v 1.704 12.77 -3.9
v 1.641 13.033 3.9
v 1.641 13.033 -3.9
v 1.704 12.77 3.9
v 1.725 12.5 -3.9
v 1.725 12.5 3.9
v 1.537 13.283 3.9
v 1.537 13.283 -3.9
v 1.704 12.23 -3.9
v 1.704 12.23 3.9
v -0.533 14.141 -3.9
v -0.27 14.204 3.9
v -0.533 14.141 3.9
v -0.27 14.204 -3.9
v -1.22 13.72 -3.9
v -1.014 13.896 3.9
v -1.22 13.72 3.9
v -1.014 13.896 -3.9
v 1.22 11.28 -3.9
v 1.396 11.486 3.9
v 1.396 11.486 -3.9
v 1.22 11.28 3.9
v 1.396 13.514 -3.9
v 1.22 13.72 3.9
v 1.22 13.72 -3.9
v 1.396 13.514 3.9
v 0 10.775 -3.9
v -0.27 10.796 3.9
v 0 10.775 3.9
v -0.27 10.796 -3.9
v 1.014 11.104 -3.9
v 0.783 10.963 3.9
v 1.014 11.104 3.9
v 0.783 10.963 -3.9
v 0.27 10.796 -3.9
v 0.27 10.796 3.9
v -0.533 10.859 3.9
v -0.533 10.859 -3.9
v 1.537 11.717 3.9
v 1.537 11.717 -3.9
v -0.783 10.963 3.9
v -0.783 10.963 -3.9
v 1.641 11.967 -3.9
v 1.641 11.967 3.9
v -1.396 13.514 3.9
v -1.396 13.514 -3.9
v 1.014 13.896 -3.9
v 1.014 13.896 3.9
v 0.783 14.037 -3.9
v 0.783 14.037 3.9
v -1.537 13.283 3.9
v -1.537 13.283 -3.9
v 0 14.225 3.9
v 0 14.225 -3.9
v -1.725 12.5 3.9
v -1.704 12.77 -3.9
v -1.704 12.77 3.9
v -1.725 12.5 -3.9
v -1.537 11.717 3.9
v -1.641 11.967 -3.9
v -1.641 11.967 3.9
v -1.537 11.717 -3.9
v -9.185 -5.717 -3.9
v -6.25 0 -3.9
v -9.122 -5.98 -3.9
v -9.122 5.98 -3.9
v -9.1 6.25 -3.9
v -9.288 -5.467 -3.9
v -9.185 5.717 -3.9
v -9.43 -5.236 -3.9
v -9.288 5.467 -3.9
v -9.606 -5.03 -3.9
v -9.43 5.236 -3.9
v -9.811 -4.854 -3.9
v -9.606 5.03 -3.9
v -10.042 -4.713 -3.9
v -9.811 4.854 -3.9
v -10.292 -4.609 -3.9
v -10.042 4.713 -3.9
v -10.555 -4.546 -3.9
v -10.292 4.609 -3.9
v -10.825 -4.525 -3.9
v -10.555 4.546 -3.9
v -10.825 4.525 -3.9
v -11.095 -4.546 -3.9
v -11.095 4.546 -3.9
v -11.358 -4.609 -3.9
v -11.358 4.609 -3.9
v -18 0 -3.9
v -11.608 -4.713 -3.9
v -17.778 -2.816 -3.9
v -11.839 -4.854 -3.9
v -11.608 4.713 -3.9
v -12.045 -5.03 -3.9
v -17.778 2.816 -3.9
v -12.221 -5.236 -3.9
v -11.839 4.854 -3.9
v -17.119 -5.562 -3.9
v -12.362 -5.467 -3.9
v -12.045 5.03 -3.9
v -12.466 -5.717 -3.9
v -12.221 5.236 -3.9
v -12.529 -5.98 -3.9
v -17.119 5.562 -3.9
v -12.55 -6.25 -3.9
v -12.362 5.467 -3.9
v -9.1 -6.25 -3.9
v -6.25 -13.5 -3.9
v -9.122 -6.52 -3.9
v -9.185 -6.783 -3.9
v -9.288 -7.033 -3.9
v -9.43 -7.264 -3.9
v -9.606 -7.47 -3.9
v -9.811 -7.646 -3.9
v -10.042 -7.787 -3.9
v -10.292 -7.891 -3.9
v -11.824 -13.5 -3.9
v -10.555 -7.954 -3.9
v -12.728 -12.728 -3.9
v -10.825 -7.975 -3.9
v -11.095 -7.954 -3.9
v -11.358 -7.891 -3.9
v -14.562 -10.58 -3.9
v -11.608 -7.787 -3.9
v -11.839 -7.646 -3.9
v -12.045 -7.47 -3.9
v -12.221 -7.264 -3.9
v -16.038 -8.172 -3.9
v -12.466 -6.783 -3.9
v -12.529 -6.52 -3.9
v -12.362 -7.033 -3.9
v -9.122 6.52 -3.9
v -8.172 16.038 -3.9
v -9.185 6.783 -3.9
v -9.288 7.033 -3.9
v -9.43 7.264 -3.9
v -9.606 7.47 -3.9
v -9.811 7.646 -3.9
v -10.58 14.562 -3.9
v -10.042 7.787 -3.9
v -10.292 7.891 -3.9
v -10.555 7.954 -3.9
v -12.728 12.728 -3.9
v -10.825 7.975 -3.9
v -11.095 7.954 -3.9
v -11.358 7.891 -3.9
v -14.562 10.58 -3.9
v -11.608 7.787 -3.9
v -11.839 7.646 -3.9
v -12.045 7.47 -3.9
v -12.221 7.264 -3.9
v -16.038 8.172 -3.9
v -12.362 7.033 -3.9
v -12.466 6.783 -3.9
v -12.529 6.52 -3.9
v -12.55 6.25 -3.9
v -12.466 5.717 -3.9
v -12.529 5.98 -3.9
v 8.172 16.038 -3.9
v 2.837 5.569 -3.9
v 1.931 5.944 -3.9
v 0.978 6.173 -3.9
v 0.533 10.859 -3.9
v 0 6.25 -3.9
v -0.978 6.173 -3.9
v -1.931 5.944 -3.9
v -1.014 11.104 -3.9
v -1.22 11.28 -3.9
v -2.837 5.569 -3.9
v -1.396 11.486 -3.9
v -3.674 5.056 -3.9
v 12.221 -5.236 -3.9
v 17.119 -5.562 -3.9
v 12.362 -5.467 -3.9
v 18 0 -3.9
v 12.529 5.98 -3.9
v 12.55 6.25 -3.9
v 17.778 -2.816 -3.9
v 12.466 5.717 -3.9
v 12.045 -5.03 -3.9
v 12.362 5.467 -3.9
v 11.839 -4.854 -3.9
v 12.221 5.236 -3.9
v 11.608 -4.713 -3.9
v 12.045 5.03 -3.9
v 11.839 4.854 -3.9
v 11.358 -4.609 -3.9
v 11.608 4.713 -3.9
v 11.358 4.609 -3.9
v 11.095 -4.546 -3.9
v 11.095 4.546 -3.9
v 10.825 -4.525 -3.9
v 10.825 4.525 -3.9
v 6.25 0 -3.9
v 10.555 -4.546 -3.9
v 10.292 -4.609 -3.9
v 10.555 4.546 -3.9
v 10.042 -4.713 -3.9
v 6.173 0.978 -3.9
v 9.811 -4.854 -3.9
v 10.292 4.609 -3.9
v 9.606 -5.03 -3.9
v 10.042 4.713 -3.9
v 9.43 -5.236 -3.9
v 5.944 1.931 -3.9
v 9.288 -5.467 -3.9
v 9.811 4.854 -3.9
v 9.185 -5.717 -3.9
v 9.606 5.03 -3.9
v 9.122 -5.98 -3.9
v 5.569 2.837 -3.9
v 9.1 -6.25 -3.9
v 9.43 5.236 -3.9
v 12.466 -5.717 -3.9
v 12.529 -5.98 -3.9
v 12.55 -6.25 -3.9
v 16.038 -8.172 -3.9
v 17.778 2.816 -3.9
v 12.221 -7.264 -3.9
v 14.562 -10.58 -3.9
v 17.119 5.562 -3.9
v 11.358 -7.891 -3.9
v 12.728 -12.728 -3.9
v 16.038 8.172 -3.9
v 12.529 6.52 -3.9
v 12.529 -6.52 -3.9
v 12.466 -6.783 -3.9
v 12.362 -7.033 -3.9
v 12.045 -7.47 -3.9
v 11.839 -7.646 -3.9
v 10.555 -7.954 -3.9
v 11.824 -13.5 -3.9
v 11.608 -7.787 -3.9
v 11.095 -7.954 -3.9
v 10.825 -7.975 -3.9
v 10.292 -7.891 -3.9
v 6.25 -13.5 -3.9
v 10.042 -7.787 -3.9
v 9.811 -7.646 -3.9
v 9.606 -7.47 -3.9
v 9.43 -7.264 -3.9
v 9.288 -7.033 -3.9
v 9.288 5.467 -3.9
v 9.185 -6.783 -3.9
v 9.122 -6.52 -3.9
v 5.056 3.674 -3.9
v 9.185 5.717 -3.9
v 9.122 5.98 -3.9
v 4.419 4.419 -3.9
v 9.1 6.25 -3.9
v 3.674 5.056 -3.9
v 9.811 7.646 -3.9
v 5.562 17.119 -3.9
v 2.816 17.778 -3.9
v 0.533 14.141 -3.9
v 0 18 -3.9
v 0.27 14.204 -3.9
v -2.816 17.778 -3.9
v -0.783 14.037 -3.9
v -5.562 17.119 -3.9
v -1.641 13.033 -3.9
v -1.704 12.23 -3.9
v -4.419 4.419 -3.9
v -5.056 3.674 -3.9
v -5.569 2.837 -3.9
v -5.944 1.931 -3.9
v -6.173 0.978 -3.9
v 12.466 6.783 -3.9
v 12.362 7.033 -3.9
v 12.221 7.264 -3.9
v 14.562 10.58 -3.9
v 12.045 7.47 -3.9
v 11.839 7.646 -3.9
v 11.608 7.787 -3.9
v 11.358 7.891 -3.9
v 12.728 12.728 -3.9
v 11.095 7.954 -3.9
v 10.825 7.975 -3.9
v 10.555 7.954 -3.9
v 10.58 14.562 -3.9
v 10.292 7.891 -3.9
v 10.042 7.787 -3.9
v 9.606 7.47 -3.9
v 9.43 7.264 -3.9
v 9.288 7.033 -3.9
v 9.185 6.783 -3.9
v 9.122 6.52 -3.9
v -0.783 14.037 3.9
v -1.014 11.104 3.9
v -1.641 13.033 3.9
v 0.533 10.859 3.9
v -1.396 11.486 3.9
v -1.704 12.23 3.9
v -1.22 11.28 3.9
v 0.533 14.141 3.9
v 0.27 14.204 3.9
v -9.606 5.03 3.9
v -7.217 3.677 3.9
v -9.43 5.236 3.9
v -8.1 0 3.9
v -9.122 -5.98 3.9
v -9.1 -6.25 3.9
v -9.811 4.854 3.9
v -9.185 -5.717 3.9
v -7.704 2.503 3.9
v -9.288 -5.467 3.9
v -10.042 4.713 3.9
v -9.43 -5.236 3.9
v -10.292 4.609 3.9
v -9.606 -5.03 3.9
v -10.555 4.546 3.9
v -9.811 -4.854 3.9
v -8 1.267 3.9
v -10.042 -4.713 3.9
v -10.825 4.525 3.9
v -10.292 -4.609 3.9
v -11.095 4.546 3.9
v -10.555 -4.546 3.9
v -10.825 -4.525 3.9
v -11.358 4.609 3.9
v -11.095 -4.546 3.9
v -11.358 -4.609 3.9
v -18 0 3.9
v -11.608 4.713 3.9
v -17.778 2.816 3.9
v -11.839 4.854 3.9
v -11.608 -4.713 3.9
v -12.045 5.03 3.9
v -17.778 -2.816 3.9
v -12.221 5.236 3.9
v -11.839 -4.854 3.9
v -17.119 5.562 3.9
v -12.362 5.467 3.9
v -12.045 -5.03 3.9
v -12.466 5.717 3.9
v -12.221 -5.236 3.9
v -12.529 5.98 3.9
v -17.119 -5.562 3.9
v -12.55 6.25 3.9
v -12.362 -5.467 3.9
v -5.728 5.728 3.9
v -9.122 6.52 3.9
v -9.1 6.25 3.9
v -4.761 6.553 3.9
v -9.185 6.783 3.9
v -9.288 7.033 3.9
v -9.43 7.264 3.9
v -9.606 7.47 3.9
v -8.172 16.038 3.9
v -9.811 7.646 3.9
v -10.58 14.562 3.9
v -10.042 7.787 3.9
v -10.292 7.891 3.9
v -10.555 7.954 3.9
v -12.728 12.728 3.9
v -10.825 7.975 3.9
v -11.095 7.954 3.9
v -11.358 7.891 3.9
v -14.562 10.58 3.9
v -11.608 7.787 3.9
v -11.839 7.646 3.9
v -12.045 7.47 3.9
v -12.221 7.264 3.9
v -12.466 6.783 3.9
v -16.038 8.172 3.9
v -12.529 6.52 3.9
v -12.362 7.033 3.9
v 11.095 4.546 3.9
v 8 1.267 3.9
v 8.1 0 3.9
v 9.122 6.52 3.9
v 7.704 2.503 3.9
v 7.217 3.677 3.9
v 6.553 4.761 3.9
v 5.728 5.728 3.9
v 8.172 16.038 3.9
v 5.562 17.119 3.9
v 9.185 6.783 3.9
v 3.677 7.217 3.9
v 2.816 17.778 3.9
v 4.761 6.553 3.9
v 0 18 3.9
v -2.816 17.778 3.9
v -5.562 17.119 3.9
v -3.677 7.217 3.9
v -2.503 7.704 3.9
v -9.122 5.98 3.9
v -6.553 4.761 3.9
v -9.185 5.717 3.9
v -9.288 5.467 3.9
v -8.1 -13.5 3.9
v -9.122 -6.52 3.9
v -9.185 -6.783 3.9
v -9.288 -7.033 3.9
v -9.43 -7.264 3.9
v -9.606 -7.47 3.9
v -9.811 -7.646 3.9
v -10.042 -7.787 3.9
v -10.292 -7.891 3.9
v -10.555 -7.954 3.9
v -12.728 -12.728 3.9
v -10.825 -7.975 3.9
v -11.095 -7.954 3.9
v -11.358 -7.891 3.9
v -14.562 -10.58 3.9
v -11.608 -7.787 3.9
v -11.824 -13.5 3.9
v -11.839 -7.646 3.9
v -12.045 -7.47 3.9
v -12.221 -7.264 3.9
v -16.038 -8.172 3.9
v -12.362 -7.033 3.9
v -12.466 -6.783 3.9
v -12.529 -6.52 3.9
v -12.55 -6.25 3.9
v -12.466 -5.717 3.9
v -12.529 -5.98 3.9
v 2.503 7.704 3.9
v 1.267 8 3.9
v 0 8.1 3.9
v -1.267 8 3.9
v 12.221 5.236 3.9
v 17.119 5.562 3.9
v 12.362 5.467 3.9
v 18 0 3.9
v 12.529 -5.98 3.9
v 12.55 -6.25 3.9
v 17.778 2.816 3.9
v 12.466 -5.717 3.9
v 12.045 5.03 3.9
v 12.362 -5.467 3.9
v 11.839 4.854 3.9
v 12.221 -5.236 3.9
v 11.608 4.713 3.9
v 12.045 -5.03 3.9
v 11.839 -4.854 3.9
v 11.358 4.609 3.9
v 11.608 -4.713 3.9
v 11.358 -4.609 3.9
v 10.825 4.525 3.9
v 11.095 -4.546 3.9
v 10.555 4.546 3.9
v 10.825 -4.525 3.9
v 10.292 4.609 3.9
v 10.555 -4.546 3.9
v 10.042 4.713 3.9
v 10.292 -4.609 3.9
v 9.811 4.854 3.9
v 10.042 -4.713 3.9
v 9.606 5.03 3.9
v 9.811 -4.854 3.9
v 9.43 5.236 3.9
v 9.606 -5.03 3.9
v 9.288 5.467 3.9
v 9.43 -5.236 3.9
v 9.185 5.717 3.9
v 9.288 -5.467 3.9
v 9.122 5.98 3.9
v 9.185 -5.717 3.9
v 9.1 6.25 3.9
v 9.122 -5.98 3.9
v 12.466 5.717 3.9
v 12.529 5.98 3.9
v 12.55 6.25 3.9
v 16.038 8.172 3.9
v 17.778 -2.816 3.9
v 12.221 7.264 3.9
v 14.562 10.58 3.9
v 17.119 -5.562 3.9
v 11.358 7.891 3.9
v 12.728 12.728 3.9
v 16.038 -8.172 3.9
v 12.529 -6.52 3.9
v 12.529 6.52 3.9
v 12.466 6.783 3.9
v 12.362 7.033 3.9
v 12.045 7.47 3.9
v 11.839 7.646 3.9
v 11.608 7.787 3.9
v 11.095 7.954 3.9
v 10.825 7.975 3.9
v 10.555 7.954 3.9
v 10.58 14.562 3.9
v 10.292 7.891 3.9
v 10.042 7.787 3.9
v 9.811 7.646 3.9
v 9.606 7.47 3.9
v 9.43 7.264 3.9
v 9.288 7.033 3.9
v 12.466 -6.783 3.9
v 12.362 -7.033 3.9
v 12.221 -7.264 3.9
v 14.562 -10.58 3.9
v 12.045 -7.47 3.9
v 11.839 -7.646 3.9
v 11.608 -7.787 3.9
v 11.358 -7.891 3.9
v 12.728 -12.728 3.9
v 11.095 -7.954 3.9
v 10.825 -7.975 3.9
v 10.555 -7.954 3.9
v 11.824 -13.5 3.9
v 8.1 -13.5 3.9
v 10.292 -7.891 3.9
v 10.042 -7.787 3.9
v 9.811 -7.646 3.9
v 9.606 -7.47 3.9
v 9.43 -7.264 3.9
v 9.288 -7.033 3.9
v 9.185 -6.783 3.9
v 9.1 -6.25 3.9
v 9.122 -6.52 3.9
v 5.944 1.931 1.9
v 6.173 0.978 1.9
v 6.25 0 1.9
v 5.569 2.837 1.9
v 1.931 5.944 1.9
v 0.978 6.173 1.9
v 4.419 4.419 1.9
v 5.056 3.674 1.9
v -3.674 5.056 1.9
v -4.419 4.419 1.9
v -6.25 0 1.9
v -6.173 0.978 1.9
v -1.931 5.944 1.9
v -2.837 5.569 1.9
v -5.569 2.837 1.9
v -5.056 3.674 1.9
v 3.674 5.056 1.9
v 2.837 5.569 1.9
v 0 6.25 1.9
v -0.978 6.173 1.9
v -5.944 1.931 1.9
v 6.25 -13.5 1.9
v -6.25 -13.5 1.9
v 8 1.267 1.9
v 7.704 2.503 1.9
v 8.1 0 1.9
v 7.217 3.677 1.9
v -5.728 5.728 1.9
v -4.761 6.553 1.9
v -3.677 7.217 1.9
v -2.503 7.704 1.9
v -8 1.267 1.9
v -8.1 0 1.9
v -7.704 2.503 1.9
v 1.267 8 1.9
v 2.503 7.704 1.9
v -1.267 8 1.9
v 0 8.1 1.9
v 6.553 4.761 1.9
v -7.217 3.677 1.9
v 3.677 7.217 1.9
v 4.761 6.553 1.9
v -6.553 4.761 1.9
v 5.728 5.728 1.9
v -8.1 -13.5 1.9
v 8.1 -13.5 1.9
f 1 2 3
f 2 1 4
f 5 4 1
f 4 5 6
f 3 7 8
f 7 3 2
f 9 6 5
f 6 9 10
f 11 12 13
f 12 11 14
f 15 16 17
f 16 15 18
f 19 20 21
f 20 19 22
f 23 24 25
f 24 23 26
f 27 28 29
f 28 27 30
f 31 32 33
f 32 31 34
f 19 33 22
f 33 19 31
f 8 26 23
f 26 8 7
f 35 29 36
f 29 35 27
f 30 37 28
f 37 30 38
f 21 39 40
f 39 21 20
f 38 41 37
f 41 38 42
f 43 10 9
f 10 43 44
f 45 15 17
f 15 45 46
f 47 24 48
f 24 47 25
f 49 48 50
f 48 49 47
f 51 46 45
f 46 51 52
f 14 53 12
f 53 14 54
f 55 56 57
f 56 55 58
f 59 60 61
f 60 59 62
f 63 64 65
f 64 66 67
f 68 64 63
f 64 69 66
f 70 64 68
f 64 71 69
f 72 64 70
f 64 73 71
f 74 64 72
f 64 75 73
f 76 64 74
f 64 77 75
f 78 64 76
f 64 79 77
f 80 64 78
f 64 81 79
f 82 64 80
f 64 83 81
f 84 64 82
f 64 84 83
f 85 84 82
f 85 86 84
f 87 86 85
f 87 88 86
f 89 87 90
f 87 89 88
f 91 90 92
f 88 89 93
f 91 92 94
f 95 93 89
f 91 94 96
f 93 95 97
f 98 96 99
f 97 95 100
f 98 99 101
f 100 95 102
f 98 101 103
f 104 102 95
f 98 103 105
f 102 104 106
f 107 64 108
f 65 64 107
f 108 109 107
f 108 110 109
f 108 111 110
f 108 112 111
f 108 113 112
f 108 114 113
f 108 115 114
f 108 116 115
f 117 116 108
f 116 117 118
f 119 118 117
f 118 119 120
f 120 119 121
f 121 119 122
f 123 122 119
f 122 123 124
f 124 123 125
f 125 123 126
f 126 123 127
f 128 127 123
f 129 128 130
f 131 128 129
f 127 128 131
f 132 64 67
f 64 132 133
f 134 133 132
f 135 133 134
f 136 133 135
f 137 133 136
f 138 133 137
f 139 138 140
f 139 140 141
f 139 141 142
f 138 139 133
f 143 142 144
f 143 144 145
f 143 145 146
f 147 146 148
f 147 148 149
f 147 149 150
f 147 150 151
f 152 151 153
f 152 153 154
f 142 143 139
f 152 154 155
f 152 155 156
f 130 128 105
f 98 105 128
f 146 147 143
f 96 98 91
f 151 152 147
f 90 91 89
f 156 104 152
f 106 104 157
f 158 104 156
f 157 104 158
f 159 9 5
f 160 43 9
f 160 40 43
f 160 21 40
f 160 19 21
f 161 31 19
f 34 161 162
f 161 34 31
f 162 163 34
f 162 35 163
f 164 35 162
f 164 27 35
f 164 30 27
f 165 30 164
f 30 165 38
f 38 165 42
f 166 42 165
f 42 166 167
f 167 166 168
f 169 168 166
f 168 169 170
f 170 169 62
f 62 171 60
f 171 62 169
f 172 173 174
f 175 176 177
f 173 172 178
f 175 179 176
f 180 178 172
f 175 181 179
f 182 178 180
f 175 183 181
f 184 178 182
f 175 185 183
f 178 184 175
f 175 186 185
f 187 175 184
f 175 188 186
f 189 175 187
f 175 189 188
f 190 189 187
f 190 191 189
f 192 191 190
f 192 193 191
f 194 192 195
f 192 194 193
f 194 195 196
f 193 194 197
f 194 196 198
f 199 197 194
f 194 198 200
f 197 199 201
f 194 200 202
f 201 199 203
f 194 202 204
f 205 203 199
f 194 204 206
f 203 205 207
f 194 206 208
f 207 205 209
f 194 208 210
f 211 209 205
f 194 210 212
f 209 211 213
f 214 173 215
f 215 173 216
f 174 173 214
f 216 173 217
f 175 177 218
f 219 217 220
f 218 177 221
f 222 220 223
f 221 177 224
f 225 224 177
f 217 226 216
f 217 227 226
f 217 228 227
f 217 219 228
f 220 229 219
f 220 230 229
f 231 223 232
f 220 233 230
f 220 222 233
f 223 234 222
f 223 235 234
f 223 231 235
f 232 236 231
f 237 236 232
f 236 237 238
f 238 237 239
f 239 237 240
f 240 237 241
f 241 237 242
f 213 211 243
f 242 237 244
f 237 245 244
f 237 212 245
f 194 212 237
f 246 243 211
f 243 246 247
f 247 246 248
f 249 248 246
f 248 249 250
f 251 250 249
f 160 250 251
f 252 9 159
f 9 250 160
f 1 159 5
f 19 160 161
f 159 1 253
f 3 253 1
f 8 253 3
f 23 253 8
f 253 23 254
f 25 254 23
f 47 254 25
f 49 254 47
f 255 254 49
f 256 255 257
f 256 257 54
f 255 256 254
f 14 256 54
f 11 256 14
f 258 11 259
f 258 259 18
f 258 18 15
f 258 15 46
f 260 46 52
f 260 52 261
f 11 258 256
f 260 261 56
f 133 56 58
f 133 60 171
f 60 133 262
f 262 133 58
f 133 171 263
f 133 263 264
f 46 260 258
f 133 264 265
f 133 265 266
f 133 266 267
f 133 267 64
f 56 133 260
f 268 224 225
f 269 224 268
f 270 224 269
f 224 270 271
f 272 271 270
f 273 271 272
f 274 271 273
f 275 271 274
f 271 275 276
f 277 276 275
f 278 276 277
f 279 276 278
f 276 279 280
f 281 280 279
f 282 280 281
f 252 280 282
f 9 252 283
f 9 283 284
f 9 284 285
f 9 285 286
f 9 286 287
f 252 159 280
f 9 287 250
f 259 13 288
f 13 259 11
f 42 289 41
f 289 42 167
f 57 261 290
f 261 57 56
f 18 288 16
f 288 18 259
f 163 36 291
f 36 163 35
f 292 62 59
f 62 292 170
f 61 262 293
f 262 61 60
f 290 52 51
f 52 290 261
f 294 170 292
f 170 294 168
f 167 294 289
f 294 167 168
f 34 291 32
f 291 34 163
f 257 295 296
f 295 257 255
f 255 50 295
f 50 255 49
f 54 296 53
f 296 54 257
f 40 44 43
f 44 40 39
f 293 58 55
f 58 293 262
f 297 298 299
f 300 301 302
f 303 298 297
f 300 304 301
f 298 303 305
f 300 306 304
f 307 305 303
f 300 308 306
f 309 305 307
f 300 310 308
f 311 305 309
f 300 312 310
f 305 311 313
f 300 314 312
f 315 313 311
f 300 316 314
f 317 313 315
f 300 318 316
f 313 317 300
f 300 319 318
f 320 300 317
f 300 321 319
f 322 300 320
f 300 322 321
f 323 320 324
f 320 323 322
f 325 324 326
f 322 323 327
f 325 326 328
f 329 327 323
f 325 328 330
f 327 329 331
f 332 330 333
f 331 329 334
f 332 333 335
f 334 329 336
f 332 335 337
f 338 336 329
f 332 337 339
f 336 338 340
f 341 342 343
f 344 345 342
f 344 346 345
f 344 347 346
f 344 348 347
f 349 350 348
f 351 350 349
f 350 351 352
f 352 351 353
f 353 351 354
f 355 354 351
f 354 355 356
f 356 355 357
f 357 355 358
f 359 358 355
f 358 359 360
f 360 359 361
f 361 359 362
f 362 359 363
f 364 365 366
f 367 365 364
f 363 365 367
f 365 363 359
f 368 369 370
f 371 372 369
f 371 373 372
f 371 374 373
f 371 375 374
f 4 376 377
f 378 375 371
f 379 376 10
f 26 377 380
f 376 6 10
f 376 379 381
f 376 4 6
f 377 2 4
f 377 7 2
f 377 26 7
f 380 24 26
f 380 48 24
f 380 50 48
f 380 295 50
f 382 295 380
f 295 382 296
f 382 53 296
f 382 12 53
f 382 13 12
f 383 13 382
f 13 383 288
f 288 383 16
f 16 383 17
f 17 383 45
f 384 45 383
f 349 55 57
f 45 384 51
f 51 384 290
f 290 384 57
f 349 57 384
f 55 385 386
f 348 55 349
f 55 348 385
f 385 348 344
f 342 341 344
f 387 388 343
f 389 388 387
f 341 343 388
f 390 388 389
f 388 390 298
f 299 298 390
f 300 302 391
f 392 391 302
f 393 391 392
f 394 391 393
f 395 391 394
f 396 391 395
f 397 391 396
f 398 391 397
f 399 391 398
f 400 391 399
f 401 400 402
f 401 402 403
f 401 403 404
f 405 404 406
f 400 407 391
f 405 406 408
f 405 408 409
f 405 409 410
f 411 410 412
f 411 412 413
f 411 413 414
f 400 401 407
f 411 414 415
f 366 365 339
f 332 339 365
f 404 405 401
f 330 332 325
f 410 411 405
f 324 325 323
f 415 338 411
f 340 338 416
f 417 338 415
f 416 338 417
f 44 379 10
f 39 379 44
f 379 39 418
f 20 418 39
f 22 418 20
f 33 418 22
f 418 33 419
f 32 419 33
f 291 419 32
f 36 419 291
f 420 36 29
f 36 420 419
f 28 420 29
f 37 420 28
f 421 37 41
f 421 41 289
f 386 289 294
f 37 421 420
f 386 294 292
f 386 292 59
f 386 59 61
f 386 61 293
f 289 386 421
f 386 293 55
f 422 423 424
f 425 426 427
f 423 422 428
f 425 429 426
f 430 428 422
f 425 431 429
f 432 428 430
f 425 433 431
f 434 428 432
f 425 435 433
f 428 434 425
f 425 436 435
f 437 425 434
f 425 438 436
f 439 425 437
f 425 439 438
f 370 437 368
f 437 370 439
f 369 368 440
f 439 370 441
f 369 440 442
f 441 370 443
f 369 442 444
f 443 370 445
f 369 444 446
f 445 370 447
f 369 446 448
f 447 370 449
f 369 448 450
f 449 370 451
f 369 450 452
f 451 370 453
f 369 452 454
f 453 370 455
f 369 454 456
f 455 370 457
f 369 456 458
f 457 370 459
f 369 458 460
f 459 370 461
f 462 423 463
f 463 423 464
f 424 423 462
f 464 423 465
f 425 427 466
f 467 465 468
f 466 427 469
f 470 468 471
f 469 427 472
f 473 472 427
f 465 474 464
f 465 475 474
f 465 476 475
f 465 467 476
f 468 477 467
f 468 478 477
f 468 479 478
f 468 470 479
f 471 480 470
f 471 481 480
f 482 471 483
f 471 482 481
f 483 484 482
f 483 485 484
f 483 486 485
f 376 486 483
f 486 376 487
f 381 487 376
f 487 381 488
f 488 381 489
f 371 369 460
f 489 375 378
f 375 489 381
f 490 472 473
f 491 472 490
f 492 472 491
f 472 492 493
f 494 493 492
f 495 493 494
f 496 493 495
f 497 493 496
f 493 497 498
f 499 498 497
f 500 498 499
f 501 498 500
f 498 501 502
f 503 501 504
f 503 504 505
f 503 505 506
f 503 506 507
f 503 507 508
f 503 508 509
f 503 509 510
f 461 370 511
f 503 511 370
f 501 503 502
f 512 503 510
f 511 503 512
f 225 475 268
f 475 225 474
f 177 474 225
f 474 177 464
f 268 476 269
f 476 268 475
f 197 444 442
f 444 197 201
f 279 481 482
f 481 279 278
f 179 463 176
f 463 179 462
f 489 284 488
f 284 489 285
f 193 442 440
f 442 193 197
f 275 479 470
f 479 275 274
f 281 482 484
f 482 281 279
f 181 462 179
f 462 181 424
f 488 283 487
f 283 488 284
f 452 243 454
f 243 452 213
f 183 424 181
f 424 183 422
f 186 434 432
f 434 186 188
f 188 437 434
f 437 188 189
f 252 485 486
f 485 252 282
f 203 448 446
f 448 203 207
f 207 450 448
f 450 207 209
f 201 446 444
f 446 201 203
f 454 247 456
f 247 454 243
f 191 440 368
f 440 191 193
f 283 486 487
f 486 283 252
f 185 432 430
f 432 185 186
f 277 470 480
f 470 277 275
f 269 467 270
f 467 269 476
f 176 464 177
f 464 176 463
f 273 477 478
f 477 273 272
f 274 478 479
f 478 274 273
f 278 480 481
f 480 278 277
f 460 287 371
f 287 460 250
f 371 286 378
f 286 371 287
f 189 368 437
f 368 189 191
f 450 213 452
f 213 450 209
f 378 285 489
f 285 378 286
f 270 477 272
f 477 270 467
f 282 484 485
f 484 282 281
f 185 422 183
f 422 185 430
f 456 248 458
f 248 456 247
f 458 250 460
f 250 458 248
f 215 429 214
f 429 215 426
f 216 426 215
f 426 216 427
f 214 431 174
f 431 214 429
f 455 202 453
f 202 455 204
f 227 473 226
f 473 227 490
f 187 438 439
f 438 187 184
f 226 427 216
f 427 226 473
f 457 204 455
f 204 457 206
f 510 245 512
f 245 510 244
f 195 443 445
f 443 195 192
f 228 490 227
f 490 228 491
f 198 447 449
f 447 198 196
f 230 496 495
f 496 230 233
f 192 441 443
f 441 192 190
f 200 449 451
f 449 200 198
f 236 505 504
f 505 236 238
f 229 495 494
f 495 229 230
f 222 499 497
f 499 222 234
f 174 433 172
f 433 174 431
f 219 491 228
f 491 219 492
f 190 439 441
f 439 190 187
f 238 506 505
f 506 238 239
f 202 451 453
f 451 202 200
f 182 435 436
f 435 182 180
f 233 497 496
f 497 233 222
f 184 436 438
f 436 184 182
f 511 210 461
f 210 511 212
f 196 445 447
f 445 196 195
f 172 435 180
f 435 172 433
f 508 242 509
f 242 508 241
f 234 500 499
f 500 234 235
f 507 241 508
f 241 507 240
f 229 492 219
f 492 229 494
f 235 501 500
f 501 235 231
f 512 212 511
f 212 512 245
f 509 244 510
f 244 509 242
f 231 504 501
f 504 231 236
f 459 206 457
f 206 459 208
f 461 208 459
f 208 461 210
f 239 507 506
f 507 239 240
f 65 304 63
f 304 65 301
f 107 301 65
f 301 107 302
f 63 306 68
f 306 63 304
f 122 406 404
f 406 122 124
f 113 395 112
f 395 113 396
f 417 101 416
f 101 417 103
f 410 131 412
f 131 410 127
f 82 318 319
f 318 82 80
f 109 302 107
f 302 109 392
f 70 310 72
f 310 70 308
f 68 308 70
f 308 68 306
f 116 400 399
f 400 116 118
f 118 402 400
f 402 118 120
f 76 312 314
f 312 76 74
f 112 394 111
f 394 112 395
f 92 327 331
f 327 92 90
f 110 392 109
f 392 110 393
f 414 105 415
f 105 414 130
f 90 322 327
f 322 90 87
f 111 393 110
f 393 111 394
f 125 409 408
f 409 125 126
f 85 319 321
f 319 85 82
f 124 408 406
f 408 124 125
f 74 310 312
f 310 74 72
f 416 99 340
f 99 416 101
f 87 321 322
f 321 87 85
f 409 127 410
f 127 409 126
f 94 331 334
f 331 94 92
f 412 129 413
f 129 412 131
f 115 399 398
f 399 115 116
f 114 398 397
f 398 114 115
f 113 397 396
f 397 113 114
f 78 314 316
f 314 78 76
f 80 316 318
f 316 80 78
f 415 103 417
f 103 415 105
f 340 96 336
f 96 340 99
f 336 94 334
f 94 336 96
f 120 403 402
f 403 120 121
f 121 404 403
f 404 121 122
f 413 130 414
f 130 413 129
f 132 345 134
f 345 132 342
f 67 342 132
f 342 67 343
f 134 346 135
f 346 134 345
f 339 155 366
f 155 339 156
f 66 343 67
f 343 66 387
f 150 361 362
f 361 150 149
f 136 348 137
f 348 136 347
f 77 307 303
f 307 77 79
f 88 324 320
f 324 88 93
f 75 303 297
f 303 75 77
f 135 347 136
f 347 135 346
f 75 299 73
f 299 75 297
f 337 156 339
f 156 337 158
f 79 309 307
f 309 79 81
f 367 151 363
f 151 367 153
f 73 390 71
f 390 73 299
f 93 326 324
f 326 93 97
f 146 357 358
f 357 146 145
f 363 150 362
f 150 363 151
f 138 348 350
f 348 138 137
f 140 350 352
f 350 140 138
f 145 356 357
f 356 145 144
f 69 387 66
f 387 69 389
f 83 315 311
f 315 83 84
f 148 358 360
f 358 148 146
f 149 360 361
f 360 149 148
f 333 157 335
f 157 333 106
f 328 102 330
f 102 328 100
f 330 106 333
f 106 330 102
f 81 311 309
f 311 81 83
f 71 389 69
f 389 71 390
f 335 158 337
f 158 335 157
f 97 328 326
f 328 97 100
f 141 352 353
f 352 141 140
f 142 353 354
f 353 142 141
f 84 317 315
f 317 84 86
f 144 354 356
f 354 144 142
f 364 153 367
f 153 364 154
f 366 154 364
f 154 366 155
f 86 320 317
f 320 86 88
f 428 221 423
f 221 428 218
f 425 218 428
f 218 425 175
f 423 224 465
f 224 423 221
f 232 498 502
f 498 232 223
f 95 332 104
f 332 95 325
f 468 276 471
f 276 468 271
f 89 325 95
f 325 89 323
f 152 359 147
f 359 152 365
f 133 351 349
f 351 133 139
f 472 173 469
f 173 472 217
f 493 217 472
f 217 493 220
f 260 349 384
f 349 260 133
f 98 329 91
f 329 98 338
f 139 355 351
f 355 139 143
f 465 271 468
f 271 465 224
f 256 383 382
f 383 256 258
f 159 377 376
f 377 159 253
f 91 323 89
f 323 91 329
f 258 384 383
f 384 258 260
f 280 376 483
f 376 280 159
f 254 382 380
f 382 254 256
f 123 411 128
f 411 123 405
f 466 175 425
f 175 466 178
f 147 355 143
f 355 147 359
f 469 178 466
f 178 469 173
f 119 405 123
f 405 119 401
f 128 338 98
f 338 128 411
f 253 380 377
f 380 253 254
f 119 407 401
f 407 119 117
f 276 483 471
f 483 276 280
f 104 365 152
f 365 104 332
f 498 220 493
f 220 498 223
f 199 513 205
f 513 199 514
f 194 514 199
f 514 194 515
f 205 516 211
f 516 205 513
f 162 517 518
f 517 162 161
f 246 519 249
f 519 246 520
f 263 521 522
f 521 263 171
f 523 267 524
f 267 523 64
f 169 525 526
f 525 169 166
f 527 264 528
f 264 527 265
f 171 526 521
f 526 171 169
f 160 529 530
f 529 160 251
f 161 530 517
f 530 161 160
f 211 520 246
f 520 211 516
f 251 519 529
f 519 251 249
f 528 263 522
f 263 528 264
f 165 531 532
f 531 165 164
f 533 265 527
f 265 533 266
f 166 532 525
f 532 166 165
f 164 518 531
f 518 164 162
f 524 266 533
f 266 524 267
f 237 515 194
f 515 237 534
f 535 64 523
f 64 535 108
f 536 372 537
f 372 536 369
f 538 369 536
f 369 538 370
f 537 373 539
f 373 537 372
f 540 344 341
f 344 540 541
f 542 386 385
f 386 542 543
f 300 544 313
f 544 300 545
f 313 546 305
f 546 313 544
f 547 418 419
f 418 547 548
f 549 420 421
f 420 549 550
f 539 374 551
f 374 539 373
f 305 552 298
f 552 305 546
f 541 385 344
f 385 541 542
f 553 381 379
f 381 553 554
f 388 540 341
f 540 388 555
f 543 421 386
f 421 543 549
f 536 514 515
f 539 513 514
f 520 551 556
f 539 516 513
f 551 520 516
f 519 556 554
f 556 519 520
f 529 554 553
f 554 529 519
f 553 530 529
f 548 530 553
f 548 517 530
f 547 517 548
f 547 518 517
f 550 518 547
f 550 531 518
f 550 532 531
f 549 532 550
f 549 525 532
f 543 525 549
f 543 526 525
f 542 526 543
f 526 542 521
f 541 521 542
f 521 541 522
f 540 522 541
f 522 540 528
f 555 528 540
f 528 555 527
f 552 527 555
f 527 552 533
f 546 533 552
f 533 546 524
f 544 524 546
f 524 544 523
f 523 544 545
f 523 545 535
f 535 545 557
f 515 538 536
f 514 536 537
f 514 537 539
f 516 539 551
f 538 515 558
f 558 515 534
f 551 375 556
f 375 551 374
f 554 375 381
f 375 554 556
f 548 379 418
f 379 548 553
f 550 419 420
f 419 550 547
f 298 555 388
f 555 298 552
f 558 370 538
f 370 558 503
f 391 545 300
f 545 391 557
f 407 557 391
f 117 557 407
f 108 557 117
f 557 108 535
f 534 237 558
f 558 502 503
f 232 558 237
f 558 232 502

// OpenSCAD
// file: configuration.scad
// Increase this if your slicer or printer make holes too tight.
extra_radius = 0.1;

// OD = outside diameter, corner to corner.
m3_nut_od = 6.1;
m3_nut_radius = m3_nut_od/2 + 0.2 + extra_radius;
m3_washer_radius = 3.5 + extra_radius;

// Major diameter of metric 3mm thread.
m3_major = 2.85;
m3_radius = m3_major/2 + extra_radius;
m3_wide_radius = m3_major/2 + extra_radius + 0.2;

// NEMA17 stepper motors.
motor_shaft_diameter = 5;
motor_shaft_radius = motor_shaft_diameter/2 + extra_radius;

// Frame brackets. M3x8mm screws work best with 3.6 mm brackets.
thickness = 3.6;

// OpenBeam or Misumi. Currently only 15x15 mm, but there is a plan
// to make models more parametric and allow 20x20 mm in the future.
extrusion = 20;

extrusion_channel_w = 5; //use 3 for 1515
extrusion_channel_d = 3; //use 3 for 1515
extrusion_fin_d = 1;

vertex_radius = 40.5; //set to 36 for 1515
vertex_x_offset = 7.25; // offset of the horizontal extrusion to the vertical one in X axis
vertex_y_offset = 39 ;//27; // offset of the horizontal extrusion to the vertical one in Y axis

// Placement for the NEMA17 stepper motors.
motor_offset = 44;
motor_length = 47;
// main file
include <configuration.scad>;

// Overall mount dimensions
mount_radius = 18;
//for e3d v6
mount_thickness = 7.8;

// Through holes
hole_radius = 12.5;

// Slot and lip for installation
slot_radius = 6.25;
lip_radius = 8.1;
//top 2mm,bottom 2mm,total is 4mm
lip_thickness = 2; //for e3d v6

$fn = 40;

difference() {
  cylinder(r=mount_radius, h=mount_thickness, center=true);

  // Thru holes
  for (hole_angle = [0:60:360]) {
    translate([sin(hole_angle)*hole_radius,cos(hole_angle)*hole_radius,0]) cylinder(r=m3_wide_radius, h=mount_thickness, center=true);
  }

  // Thru slot
  cylinder(r=slot_radius, h=mount_thickness, center=true);
  translate([0, -mount_radius/2, 0]) cube([2*slot_radius, mount_radius, mount_thickness], center=true);

  // Lip 
  translate([0, 0, (mount_thickness-lip_thickness)/2]) cylinder(r=lip_radius, h=lip_thickness, center=true);
  translate([0, -mount_radius/2, (mount_thickness-lip_thickness)/2]) cube([2*lip_radius, mount_radius, lip_thickness], center=true);

  // Cut off the sharp edges at the front
  translate([0, -7/4*mount_radius, 0]) cube([2*mount_radius, 2*mount_radius, mount_thickness], center=true);
};
